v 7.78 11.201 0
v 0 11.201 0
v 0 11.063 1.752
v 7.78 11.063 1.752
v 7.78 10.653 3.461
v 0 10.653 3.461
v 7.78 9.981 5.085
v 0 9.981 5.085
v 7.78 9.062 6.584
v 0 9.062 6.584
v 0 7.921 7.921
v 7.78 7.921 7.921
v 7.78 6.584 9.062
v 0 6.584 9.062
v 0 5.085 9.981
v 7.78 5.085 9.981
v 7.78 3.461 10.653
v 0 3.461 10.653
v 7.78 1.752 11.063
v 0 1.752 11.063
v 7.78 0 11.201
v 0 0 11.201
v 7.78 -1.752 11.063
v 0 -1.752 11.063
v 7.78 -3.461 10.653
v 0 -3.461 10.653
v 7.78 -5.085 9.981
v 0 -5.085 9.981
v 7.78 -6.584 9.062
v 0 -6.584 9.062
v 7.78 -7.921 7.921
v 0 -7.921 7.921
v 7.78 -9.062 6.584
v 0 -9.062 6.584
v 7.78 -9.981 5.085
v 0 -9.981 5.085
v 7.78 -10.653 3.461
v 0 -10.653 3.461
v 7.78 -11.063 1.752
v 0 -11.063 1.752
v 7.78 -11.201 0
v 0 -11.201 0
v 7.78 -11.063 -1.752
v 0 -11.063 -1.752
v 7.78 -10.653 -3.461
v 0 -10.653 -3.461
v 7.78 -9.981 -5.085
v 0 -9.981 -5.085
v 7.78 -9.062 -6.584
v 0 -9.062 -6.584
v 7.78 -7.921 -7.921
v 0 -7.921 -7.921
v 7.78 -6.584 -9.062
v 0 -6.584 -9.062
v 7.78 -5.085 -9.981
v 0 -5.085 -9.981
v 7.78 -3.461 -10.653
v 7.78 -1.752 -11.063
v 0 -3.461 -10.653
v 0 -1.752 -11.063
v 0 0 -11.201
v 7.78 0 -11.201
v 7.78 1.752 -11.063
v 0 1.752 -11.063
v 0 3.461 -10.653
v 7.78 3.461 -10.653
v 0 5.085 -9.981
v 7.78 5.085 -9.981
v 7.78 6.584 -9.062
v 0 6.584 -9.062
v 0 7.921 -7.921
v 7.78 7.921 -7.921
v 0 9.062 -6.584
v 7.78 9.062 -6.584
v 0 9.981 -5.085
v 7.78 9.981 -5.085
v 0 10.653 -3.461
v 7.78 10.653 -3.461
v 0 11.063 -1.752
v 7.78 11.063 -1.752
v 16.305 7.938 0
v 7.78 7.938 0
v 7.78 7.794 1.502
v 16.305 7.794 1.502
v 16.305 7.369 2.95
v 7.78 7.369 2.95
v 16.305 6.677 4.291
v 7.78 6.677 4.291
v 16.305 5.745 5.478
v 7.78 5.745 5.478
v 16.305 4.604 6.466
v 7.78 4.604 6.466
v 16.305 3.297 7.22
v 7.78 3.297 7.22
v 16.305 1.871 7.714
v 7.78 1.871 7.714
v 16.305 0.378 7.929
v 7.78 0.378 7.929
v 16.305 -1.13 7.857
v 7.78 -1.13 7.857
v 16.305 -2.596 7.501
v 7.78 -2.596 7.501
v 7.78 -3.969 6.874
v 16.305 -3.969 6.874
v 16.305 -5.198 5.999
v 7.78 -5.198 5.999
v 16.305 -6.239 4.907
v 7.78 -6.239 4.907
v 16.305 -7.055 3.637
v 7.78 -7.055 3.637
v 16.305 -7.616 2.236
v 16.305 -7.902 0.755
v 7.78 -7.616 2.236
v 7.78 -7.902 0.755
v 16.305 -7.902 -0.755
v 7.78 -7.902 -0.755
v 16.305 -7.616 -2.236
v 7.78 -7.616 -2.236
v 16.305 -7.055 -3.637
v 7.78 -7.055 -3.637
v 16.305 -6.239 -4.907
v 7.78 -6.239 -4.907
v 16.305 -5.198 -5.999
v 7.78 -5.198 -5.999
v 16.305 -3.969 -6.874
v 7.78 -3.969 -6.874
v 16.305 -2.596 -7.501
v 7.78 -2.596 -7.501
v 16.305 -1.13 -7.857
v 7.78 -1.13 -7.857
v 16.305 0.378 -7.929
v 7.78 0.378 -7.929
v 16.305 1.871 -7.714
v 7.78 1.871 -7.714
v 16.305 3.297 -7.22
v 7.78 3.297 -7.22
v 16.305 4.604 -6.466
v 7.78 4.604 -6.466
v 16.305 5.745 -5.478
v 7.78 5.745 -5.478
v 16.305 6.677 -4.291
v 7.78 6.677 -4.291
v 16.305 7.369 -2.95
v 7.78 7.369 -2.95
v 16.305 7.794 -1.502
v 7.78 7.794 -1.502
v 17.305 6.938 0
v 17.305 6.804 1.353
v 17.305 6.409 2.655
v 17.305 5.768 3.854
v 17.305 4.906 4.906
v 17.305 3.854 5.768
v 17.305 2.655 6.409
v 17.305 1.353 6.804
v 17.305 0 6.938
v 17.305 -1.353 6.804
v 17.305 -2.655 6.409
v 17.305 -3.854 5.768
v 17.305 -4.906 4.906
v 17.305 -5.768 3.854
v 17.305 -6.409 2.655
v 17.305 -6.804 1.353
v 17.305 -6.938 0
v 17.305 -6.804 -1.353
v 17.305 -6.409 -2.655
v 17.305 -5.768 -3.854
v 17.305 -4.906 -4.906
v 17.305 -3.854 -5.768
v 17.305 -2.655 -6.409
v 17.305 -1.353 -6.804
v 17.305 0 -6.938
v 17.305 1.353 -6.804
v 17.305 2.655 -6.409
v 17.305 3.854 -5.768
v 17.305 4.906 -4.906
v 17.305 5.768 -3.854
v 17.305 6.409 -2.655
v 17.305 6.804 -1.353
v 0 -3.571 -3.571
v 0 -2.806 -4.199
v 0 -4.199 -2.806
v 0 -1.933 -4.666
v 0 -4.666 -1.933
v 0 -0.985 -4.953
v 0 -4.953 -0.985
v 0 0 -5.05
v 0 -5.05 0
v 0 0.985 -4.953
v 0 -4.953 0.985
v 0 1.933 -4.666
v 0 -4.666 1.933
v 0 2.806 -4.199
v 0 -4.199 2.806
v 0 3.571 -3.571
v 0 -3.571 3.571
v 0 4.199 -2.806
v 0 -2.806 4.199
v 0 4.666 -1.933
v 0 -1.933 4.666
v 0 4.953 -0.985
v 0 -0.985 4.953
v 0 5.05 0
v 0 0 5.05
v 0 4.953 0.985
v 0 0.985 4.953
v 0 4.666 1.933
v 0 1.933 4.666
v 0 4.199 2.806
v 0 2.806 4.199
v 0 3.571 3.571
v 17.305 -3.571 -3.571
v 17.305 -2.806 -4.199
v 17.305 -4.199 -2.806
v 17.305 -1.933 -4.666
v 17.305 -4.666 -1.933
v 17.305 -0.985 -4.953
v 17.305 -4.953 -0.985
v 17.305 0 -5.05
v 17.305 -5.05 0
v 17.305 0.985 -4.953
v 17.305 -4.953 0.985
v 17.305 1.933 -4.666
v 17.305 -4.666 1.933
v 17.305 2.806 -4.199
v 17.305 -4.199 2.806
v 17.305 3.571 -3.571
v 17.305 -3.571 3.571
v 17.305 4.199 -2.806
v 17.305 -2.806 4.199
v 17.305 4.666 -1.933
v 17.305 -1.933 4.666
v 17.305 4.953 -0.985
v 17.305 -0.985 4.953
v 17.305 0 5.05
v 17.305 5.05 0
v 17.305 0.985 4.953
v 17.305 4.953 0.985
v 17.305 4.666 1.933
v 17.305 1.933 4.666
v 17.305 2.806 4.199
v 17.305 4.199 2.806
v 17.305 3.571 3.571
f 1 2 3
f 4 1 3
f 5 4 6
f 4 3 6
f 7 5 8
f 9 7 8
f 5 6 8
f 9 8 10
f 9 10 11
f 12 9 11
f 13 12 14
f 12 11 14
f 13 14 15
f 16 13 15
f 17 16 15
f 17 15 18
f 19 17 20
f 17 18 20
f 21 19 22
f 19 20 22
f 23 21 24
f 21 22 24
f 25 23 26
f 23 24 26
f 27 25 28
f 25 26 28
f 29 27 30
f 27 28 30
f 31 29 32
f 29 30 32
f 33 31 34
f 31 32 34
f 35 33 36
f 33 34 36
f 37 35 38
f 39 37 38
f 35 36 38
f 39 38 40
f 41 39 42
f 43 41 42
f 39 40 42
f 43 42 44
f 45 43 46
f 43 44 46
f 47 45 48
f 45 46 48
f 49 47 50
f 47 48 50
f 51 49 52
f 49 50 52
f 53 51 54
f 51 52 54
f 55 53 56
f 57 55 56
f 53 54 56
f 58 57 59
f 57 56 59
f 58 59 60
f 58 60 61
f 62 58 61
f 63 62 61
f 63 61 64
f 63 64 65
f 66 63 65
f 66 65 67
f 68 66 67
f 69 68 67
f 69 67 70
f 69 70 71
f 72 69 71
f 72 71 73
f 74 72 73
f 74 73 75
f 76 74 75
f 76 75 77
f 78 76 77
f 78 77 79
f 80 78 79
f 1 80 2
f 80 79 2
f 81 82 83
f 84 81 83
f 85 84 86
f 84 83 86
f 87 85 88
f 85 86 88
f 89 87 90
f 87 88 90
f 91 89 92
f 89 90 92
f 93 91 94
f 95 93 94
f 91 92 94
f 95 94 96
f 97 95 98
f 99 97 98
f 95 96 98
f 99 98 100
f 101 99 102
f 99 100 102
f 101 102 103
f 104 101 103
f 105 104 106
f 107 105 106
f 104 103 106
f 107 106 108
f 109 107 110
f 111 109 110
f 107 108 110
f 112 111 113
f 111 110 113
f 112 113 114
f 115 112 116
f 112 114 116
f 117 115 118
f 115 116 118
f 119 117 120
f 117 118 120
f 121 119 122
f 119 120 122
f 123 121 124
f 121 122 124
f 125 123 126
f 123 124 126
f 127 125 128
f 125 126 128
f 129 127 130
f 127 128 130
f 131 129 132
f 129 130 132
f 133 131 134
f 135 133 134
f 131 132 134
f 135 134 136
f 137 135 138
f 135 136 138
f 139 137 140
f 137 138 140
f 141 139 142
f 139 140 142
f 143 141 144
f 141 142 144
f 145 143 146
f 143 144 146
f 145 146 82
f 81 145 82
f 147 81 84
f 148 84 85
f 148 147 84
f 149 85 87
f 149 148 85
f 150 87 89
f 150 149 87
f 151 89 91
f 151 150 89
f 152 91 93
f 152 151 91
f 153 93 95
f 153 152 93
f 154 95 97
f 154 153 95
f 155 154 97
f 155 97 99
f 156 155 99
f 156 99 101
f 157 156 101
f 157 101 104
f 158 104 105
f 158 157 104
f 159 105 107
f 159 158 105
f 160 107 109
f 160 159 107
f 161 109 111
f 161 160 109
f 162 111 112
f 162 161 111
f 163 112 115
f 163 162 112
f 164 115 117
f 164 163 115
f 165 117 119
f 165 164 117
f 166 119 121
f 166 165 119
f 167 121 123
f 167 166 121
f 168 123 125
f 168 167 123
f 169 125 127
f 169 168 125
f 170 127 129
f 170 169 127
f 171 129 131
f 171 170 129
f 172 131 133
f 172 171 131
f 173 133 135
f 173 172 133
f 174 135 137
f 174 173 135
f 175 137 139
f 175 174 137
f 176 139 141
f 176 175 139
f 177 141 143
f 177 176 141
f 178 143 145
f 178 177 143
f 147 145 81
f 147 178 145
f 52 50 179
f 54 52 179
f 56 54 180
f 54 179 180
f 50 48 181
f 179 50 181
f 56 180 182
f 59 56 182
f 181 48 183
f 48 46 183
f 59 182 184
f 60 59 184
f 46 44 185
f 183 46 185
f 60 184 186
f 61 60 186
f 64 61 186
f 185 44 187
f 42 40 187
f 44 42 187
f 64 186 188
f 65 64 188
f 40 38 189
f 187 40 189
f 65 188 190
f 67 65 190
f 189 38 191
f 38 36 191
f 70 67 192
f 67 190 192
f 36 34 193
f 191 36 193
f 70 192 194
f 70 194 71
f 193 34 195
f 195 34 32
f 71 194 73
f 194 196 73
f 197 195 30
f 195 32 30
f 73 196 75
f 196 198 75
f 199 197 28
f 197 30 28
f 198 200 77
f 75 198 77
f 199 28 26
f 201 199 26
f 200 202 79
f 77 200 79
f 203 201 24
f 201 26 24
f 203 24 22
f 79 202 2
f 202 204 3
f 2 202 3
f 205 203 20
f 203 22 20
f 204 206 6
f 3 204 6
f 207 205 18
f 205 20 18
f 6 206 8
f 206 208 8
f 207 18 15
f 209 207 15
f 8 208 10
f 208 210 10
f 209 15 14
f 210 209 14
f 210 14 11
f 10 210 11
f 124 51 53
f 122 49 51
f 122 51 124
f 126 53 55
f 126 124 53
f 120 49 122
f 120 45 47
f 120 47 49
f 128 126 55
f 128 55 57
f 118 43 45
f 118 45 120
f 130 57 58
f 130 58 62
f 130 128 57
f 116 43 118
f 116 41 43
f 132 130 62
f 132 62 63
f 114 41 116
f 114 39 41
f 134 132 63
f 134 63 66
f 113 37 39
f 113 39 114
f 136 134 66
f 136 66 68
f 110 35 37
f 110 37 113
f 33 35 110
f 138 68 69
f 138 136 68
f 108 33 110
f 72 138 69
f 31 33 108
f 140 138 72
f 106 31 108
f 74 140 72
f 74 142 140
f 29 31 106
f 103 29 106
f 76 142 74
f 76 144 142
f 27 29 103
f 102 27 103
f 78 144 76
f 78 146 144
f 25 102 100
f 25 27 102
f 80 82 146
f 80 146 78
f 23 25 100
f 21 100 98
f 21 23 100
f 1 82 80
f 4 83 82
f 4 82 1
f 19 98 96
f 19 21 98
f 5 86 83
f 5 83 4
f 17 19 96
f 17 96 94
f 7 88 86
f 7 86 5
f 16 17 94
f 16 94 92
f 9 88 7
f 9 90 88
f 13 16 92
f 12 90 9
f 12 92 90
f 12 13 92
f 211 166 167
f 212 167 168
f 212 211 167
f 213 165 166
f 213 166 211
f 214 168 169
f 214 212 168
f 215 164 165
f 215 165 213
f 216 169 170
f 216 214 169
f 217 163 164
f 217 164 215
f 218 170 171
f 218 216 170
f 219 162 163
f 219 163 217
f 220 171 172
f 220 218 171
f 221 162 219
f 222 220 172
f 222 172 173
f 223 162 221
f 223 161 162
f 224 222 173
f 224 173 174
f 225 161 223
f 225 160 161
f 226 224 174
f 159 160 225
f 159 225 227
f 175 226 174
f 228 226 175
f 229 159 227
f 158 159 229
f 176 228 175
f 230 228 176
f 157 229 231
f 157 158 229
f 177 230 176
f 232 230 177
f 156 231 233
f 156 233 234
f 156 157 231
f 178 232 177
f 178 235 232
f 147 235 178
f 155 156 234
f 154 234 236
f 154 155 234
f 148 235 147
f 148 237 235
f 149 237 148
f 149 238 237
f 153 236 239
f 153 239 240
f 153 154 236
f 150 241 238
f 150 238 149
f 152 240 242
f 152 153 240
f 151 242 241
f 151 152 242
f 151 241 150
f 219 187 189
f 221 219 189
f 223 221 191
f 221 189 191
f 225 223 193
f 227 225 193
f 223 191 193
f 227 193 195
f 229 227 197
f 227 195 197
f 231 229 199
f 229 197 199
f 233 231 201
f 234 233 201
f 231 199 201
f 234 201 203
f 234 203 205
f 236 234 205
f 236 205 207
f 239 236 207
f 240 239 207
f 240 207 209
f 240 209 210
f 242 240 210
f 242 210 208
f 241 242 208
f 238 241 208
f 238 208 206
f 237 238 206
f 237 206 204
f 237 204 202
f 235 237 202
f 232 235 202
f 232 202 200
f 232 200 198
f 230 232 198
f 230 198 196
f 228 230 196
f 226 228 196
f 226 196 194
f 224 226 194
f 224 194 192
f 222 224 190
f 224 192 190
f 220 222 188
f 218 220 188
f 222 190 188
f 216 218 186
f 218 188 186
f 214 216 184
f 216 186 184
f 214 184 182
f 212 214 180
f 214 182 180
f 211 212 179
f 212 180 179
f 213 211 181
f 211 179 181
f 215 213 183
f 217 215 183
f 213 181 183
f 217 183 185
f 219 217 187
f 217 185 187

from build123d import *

# Parameters (mm, degrees)
F0_R     = 11.2014
F1_DEPTH = 7.78
F2_R     = 7.9375
F3_DEPTH = 9.525
F5_D     = 10.1
F6_SIZE2 = 1
F6_SIZE  = 1


with BuildPart() as f1:
    # F0 (on Right) → F1 (new body)
    with BuildSketch(Plane.YZ):
        Circle(F0_R)
    extrude(amount=F1_DEPTH)

    # F2 (on face) → F3 (join)
    with BuildSketch(Plane.YZ.offset(7.78)):
        Circle(F2_R)
    extrude(amount=F3_DEPTH)

    # F5 (through all)
    with Locations(Plane.YZ.offset(17.305)):
        with Locations((0, 0)):
            Hole(F5_D / 2)

    # F6
    f6_edges = [f1.edges().sort_by_distance(p)[0] for p in [
        (17.305, -7.9375, 0),
    ]]
    chamfer(f6_edges, length=F6_SIZE, length2=F6_SIZE2)


solid = f1.part
